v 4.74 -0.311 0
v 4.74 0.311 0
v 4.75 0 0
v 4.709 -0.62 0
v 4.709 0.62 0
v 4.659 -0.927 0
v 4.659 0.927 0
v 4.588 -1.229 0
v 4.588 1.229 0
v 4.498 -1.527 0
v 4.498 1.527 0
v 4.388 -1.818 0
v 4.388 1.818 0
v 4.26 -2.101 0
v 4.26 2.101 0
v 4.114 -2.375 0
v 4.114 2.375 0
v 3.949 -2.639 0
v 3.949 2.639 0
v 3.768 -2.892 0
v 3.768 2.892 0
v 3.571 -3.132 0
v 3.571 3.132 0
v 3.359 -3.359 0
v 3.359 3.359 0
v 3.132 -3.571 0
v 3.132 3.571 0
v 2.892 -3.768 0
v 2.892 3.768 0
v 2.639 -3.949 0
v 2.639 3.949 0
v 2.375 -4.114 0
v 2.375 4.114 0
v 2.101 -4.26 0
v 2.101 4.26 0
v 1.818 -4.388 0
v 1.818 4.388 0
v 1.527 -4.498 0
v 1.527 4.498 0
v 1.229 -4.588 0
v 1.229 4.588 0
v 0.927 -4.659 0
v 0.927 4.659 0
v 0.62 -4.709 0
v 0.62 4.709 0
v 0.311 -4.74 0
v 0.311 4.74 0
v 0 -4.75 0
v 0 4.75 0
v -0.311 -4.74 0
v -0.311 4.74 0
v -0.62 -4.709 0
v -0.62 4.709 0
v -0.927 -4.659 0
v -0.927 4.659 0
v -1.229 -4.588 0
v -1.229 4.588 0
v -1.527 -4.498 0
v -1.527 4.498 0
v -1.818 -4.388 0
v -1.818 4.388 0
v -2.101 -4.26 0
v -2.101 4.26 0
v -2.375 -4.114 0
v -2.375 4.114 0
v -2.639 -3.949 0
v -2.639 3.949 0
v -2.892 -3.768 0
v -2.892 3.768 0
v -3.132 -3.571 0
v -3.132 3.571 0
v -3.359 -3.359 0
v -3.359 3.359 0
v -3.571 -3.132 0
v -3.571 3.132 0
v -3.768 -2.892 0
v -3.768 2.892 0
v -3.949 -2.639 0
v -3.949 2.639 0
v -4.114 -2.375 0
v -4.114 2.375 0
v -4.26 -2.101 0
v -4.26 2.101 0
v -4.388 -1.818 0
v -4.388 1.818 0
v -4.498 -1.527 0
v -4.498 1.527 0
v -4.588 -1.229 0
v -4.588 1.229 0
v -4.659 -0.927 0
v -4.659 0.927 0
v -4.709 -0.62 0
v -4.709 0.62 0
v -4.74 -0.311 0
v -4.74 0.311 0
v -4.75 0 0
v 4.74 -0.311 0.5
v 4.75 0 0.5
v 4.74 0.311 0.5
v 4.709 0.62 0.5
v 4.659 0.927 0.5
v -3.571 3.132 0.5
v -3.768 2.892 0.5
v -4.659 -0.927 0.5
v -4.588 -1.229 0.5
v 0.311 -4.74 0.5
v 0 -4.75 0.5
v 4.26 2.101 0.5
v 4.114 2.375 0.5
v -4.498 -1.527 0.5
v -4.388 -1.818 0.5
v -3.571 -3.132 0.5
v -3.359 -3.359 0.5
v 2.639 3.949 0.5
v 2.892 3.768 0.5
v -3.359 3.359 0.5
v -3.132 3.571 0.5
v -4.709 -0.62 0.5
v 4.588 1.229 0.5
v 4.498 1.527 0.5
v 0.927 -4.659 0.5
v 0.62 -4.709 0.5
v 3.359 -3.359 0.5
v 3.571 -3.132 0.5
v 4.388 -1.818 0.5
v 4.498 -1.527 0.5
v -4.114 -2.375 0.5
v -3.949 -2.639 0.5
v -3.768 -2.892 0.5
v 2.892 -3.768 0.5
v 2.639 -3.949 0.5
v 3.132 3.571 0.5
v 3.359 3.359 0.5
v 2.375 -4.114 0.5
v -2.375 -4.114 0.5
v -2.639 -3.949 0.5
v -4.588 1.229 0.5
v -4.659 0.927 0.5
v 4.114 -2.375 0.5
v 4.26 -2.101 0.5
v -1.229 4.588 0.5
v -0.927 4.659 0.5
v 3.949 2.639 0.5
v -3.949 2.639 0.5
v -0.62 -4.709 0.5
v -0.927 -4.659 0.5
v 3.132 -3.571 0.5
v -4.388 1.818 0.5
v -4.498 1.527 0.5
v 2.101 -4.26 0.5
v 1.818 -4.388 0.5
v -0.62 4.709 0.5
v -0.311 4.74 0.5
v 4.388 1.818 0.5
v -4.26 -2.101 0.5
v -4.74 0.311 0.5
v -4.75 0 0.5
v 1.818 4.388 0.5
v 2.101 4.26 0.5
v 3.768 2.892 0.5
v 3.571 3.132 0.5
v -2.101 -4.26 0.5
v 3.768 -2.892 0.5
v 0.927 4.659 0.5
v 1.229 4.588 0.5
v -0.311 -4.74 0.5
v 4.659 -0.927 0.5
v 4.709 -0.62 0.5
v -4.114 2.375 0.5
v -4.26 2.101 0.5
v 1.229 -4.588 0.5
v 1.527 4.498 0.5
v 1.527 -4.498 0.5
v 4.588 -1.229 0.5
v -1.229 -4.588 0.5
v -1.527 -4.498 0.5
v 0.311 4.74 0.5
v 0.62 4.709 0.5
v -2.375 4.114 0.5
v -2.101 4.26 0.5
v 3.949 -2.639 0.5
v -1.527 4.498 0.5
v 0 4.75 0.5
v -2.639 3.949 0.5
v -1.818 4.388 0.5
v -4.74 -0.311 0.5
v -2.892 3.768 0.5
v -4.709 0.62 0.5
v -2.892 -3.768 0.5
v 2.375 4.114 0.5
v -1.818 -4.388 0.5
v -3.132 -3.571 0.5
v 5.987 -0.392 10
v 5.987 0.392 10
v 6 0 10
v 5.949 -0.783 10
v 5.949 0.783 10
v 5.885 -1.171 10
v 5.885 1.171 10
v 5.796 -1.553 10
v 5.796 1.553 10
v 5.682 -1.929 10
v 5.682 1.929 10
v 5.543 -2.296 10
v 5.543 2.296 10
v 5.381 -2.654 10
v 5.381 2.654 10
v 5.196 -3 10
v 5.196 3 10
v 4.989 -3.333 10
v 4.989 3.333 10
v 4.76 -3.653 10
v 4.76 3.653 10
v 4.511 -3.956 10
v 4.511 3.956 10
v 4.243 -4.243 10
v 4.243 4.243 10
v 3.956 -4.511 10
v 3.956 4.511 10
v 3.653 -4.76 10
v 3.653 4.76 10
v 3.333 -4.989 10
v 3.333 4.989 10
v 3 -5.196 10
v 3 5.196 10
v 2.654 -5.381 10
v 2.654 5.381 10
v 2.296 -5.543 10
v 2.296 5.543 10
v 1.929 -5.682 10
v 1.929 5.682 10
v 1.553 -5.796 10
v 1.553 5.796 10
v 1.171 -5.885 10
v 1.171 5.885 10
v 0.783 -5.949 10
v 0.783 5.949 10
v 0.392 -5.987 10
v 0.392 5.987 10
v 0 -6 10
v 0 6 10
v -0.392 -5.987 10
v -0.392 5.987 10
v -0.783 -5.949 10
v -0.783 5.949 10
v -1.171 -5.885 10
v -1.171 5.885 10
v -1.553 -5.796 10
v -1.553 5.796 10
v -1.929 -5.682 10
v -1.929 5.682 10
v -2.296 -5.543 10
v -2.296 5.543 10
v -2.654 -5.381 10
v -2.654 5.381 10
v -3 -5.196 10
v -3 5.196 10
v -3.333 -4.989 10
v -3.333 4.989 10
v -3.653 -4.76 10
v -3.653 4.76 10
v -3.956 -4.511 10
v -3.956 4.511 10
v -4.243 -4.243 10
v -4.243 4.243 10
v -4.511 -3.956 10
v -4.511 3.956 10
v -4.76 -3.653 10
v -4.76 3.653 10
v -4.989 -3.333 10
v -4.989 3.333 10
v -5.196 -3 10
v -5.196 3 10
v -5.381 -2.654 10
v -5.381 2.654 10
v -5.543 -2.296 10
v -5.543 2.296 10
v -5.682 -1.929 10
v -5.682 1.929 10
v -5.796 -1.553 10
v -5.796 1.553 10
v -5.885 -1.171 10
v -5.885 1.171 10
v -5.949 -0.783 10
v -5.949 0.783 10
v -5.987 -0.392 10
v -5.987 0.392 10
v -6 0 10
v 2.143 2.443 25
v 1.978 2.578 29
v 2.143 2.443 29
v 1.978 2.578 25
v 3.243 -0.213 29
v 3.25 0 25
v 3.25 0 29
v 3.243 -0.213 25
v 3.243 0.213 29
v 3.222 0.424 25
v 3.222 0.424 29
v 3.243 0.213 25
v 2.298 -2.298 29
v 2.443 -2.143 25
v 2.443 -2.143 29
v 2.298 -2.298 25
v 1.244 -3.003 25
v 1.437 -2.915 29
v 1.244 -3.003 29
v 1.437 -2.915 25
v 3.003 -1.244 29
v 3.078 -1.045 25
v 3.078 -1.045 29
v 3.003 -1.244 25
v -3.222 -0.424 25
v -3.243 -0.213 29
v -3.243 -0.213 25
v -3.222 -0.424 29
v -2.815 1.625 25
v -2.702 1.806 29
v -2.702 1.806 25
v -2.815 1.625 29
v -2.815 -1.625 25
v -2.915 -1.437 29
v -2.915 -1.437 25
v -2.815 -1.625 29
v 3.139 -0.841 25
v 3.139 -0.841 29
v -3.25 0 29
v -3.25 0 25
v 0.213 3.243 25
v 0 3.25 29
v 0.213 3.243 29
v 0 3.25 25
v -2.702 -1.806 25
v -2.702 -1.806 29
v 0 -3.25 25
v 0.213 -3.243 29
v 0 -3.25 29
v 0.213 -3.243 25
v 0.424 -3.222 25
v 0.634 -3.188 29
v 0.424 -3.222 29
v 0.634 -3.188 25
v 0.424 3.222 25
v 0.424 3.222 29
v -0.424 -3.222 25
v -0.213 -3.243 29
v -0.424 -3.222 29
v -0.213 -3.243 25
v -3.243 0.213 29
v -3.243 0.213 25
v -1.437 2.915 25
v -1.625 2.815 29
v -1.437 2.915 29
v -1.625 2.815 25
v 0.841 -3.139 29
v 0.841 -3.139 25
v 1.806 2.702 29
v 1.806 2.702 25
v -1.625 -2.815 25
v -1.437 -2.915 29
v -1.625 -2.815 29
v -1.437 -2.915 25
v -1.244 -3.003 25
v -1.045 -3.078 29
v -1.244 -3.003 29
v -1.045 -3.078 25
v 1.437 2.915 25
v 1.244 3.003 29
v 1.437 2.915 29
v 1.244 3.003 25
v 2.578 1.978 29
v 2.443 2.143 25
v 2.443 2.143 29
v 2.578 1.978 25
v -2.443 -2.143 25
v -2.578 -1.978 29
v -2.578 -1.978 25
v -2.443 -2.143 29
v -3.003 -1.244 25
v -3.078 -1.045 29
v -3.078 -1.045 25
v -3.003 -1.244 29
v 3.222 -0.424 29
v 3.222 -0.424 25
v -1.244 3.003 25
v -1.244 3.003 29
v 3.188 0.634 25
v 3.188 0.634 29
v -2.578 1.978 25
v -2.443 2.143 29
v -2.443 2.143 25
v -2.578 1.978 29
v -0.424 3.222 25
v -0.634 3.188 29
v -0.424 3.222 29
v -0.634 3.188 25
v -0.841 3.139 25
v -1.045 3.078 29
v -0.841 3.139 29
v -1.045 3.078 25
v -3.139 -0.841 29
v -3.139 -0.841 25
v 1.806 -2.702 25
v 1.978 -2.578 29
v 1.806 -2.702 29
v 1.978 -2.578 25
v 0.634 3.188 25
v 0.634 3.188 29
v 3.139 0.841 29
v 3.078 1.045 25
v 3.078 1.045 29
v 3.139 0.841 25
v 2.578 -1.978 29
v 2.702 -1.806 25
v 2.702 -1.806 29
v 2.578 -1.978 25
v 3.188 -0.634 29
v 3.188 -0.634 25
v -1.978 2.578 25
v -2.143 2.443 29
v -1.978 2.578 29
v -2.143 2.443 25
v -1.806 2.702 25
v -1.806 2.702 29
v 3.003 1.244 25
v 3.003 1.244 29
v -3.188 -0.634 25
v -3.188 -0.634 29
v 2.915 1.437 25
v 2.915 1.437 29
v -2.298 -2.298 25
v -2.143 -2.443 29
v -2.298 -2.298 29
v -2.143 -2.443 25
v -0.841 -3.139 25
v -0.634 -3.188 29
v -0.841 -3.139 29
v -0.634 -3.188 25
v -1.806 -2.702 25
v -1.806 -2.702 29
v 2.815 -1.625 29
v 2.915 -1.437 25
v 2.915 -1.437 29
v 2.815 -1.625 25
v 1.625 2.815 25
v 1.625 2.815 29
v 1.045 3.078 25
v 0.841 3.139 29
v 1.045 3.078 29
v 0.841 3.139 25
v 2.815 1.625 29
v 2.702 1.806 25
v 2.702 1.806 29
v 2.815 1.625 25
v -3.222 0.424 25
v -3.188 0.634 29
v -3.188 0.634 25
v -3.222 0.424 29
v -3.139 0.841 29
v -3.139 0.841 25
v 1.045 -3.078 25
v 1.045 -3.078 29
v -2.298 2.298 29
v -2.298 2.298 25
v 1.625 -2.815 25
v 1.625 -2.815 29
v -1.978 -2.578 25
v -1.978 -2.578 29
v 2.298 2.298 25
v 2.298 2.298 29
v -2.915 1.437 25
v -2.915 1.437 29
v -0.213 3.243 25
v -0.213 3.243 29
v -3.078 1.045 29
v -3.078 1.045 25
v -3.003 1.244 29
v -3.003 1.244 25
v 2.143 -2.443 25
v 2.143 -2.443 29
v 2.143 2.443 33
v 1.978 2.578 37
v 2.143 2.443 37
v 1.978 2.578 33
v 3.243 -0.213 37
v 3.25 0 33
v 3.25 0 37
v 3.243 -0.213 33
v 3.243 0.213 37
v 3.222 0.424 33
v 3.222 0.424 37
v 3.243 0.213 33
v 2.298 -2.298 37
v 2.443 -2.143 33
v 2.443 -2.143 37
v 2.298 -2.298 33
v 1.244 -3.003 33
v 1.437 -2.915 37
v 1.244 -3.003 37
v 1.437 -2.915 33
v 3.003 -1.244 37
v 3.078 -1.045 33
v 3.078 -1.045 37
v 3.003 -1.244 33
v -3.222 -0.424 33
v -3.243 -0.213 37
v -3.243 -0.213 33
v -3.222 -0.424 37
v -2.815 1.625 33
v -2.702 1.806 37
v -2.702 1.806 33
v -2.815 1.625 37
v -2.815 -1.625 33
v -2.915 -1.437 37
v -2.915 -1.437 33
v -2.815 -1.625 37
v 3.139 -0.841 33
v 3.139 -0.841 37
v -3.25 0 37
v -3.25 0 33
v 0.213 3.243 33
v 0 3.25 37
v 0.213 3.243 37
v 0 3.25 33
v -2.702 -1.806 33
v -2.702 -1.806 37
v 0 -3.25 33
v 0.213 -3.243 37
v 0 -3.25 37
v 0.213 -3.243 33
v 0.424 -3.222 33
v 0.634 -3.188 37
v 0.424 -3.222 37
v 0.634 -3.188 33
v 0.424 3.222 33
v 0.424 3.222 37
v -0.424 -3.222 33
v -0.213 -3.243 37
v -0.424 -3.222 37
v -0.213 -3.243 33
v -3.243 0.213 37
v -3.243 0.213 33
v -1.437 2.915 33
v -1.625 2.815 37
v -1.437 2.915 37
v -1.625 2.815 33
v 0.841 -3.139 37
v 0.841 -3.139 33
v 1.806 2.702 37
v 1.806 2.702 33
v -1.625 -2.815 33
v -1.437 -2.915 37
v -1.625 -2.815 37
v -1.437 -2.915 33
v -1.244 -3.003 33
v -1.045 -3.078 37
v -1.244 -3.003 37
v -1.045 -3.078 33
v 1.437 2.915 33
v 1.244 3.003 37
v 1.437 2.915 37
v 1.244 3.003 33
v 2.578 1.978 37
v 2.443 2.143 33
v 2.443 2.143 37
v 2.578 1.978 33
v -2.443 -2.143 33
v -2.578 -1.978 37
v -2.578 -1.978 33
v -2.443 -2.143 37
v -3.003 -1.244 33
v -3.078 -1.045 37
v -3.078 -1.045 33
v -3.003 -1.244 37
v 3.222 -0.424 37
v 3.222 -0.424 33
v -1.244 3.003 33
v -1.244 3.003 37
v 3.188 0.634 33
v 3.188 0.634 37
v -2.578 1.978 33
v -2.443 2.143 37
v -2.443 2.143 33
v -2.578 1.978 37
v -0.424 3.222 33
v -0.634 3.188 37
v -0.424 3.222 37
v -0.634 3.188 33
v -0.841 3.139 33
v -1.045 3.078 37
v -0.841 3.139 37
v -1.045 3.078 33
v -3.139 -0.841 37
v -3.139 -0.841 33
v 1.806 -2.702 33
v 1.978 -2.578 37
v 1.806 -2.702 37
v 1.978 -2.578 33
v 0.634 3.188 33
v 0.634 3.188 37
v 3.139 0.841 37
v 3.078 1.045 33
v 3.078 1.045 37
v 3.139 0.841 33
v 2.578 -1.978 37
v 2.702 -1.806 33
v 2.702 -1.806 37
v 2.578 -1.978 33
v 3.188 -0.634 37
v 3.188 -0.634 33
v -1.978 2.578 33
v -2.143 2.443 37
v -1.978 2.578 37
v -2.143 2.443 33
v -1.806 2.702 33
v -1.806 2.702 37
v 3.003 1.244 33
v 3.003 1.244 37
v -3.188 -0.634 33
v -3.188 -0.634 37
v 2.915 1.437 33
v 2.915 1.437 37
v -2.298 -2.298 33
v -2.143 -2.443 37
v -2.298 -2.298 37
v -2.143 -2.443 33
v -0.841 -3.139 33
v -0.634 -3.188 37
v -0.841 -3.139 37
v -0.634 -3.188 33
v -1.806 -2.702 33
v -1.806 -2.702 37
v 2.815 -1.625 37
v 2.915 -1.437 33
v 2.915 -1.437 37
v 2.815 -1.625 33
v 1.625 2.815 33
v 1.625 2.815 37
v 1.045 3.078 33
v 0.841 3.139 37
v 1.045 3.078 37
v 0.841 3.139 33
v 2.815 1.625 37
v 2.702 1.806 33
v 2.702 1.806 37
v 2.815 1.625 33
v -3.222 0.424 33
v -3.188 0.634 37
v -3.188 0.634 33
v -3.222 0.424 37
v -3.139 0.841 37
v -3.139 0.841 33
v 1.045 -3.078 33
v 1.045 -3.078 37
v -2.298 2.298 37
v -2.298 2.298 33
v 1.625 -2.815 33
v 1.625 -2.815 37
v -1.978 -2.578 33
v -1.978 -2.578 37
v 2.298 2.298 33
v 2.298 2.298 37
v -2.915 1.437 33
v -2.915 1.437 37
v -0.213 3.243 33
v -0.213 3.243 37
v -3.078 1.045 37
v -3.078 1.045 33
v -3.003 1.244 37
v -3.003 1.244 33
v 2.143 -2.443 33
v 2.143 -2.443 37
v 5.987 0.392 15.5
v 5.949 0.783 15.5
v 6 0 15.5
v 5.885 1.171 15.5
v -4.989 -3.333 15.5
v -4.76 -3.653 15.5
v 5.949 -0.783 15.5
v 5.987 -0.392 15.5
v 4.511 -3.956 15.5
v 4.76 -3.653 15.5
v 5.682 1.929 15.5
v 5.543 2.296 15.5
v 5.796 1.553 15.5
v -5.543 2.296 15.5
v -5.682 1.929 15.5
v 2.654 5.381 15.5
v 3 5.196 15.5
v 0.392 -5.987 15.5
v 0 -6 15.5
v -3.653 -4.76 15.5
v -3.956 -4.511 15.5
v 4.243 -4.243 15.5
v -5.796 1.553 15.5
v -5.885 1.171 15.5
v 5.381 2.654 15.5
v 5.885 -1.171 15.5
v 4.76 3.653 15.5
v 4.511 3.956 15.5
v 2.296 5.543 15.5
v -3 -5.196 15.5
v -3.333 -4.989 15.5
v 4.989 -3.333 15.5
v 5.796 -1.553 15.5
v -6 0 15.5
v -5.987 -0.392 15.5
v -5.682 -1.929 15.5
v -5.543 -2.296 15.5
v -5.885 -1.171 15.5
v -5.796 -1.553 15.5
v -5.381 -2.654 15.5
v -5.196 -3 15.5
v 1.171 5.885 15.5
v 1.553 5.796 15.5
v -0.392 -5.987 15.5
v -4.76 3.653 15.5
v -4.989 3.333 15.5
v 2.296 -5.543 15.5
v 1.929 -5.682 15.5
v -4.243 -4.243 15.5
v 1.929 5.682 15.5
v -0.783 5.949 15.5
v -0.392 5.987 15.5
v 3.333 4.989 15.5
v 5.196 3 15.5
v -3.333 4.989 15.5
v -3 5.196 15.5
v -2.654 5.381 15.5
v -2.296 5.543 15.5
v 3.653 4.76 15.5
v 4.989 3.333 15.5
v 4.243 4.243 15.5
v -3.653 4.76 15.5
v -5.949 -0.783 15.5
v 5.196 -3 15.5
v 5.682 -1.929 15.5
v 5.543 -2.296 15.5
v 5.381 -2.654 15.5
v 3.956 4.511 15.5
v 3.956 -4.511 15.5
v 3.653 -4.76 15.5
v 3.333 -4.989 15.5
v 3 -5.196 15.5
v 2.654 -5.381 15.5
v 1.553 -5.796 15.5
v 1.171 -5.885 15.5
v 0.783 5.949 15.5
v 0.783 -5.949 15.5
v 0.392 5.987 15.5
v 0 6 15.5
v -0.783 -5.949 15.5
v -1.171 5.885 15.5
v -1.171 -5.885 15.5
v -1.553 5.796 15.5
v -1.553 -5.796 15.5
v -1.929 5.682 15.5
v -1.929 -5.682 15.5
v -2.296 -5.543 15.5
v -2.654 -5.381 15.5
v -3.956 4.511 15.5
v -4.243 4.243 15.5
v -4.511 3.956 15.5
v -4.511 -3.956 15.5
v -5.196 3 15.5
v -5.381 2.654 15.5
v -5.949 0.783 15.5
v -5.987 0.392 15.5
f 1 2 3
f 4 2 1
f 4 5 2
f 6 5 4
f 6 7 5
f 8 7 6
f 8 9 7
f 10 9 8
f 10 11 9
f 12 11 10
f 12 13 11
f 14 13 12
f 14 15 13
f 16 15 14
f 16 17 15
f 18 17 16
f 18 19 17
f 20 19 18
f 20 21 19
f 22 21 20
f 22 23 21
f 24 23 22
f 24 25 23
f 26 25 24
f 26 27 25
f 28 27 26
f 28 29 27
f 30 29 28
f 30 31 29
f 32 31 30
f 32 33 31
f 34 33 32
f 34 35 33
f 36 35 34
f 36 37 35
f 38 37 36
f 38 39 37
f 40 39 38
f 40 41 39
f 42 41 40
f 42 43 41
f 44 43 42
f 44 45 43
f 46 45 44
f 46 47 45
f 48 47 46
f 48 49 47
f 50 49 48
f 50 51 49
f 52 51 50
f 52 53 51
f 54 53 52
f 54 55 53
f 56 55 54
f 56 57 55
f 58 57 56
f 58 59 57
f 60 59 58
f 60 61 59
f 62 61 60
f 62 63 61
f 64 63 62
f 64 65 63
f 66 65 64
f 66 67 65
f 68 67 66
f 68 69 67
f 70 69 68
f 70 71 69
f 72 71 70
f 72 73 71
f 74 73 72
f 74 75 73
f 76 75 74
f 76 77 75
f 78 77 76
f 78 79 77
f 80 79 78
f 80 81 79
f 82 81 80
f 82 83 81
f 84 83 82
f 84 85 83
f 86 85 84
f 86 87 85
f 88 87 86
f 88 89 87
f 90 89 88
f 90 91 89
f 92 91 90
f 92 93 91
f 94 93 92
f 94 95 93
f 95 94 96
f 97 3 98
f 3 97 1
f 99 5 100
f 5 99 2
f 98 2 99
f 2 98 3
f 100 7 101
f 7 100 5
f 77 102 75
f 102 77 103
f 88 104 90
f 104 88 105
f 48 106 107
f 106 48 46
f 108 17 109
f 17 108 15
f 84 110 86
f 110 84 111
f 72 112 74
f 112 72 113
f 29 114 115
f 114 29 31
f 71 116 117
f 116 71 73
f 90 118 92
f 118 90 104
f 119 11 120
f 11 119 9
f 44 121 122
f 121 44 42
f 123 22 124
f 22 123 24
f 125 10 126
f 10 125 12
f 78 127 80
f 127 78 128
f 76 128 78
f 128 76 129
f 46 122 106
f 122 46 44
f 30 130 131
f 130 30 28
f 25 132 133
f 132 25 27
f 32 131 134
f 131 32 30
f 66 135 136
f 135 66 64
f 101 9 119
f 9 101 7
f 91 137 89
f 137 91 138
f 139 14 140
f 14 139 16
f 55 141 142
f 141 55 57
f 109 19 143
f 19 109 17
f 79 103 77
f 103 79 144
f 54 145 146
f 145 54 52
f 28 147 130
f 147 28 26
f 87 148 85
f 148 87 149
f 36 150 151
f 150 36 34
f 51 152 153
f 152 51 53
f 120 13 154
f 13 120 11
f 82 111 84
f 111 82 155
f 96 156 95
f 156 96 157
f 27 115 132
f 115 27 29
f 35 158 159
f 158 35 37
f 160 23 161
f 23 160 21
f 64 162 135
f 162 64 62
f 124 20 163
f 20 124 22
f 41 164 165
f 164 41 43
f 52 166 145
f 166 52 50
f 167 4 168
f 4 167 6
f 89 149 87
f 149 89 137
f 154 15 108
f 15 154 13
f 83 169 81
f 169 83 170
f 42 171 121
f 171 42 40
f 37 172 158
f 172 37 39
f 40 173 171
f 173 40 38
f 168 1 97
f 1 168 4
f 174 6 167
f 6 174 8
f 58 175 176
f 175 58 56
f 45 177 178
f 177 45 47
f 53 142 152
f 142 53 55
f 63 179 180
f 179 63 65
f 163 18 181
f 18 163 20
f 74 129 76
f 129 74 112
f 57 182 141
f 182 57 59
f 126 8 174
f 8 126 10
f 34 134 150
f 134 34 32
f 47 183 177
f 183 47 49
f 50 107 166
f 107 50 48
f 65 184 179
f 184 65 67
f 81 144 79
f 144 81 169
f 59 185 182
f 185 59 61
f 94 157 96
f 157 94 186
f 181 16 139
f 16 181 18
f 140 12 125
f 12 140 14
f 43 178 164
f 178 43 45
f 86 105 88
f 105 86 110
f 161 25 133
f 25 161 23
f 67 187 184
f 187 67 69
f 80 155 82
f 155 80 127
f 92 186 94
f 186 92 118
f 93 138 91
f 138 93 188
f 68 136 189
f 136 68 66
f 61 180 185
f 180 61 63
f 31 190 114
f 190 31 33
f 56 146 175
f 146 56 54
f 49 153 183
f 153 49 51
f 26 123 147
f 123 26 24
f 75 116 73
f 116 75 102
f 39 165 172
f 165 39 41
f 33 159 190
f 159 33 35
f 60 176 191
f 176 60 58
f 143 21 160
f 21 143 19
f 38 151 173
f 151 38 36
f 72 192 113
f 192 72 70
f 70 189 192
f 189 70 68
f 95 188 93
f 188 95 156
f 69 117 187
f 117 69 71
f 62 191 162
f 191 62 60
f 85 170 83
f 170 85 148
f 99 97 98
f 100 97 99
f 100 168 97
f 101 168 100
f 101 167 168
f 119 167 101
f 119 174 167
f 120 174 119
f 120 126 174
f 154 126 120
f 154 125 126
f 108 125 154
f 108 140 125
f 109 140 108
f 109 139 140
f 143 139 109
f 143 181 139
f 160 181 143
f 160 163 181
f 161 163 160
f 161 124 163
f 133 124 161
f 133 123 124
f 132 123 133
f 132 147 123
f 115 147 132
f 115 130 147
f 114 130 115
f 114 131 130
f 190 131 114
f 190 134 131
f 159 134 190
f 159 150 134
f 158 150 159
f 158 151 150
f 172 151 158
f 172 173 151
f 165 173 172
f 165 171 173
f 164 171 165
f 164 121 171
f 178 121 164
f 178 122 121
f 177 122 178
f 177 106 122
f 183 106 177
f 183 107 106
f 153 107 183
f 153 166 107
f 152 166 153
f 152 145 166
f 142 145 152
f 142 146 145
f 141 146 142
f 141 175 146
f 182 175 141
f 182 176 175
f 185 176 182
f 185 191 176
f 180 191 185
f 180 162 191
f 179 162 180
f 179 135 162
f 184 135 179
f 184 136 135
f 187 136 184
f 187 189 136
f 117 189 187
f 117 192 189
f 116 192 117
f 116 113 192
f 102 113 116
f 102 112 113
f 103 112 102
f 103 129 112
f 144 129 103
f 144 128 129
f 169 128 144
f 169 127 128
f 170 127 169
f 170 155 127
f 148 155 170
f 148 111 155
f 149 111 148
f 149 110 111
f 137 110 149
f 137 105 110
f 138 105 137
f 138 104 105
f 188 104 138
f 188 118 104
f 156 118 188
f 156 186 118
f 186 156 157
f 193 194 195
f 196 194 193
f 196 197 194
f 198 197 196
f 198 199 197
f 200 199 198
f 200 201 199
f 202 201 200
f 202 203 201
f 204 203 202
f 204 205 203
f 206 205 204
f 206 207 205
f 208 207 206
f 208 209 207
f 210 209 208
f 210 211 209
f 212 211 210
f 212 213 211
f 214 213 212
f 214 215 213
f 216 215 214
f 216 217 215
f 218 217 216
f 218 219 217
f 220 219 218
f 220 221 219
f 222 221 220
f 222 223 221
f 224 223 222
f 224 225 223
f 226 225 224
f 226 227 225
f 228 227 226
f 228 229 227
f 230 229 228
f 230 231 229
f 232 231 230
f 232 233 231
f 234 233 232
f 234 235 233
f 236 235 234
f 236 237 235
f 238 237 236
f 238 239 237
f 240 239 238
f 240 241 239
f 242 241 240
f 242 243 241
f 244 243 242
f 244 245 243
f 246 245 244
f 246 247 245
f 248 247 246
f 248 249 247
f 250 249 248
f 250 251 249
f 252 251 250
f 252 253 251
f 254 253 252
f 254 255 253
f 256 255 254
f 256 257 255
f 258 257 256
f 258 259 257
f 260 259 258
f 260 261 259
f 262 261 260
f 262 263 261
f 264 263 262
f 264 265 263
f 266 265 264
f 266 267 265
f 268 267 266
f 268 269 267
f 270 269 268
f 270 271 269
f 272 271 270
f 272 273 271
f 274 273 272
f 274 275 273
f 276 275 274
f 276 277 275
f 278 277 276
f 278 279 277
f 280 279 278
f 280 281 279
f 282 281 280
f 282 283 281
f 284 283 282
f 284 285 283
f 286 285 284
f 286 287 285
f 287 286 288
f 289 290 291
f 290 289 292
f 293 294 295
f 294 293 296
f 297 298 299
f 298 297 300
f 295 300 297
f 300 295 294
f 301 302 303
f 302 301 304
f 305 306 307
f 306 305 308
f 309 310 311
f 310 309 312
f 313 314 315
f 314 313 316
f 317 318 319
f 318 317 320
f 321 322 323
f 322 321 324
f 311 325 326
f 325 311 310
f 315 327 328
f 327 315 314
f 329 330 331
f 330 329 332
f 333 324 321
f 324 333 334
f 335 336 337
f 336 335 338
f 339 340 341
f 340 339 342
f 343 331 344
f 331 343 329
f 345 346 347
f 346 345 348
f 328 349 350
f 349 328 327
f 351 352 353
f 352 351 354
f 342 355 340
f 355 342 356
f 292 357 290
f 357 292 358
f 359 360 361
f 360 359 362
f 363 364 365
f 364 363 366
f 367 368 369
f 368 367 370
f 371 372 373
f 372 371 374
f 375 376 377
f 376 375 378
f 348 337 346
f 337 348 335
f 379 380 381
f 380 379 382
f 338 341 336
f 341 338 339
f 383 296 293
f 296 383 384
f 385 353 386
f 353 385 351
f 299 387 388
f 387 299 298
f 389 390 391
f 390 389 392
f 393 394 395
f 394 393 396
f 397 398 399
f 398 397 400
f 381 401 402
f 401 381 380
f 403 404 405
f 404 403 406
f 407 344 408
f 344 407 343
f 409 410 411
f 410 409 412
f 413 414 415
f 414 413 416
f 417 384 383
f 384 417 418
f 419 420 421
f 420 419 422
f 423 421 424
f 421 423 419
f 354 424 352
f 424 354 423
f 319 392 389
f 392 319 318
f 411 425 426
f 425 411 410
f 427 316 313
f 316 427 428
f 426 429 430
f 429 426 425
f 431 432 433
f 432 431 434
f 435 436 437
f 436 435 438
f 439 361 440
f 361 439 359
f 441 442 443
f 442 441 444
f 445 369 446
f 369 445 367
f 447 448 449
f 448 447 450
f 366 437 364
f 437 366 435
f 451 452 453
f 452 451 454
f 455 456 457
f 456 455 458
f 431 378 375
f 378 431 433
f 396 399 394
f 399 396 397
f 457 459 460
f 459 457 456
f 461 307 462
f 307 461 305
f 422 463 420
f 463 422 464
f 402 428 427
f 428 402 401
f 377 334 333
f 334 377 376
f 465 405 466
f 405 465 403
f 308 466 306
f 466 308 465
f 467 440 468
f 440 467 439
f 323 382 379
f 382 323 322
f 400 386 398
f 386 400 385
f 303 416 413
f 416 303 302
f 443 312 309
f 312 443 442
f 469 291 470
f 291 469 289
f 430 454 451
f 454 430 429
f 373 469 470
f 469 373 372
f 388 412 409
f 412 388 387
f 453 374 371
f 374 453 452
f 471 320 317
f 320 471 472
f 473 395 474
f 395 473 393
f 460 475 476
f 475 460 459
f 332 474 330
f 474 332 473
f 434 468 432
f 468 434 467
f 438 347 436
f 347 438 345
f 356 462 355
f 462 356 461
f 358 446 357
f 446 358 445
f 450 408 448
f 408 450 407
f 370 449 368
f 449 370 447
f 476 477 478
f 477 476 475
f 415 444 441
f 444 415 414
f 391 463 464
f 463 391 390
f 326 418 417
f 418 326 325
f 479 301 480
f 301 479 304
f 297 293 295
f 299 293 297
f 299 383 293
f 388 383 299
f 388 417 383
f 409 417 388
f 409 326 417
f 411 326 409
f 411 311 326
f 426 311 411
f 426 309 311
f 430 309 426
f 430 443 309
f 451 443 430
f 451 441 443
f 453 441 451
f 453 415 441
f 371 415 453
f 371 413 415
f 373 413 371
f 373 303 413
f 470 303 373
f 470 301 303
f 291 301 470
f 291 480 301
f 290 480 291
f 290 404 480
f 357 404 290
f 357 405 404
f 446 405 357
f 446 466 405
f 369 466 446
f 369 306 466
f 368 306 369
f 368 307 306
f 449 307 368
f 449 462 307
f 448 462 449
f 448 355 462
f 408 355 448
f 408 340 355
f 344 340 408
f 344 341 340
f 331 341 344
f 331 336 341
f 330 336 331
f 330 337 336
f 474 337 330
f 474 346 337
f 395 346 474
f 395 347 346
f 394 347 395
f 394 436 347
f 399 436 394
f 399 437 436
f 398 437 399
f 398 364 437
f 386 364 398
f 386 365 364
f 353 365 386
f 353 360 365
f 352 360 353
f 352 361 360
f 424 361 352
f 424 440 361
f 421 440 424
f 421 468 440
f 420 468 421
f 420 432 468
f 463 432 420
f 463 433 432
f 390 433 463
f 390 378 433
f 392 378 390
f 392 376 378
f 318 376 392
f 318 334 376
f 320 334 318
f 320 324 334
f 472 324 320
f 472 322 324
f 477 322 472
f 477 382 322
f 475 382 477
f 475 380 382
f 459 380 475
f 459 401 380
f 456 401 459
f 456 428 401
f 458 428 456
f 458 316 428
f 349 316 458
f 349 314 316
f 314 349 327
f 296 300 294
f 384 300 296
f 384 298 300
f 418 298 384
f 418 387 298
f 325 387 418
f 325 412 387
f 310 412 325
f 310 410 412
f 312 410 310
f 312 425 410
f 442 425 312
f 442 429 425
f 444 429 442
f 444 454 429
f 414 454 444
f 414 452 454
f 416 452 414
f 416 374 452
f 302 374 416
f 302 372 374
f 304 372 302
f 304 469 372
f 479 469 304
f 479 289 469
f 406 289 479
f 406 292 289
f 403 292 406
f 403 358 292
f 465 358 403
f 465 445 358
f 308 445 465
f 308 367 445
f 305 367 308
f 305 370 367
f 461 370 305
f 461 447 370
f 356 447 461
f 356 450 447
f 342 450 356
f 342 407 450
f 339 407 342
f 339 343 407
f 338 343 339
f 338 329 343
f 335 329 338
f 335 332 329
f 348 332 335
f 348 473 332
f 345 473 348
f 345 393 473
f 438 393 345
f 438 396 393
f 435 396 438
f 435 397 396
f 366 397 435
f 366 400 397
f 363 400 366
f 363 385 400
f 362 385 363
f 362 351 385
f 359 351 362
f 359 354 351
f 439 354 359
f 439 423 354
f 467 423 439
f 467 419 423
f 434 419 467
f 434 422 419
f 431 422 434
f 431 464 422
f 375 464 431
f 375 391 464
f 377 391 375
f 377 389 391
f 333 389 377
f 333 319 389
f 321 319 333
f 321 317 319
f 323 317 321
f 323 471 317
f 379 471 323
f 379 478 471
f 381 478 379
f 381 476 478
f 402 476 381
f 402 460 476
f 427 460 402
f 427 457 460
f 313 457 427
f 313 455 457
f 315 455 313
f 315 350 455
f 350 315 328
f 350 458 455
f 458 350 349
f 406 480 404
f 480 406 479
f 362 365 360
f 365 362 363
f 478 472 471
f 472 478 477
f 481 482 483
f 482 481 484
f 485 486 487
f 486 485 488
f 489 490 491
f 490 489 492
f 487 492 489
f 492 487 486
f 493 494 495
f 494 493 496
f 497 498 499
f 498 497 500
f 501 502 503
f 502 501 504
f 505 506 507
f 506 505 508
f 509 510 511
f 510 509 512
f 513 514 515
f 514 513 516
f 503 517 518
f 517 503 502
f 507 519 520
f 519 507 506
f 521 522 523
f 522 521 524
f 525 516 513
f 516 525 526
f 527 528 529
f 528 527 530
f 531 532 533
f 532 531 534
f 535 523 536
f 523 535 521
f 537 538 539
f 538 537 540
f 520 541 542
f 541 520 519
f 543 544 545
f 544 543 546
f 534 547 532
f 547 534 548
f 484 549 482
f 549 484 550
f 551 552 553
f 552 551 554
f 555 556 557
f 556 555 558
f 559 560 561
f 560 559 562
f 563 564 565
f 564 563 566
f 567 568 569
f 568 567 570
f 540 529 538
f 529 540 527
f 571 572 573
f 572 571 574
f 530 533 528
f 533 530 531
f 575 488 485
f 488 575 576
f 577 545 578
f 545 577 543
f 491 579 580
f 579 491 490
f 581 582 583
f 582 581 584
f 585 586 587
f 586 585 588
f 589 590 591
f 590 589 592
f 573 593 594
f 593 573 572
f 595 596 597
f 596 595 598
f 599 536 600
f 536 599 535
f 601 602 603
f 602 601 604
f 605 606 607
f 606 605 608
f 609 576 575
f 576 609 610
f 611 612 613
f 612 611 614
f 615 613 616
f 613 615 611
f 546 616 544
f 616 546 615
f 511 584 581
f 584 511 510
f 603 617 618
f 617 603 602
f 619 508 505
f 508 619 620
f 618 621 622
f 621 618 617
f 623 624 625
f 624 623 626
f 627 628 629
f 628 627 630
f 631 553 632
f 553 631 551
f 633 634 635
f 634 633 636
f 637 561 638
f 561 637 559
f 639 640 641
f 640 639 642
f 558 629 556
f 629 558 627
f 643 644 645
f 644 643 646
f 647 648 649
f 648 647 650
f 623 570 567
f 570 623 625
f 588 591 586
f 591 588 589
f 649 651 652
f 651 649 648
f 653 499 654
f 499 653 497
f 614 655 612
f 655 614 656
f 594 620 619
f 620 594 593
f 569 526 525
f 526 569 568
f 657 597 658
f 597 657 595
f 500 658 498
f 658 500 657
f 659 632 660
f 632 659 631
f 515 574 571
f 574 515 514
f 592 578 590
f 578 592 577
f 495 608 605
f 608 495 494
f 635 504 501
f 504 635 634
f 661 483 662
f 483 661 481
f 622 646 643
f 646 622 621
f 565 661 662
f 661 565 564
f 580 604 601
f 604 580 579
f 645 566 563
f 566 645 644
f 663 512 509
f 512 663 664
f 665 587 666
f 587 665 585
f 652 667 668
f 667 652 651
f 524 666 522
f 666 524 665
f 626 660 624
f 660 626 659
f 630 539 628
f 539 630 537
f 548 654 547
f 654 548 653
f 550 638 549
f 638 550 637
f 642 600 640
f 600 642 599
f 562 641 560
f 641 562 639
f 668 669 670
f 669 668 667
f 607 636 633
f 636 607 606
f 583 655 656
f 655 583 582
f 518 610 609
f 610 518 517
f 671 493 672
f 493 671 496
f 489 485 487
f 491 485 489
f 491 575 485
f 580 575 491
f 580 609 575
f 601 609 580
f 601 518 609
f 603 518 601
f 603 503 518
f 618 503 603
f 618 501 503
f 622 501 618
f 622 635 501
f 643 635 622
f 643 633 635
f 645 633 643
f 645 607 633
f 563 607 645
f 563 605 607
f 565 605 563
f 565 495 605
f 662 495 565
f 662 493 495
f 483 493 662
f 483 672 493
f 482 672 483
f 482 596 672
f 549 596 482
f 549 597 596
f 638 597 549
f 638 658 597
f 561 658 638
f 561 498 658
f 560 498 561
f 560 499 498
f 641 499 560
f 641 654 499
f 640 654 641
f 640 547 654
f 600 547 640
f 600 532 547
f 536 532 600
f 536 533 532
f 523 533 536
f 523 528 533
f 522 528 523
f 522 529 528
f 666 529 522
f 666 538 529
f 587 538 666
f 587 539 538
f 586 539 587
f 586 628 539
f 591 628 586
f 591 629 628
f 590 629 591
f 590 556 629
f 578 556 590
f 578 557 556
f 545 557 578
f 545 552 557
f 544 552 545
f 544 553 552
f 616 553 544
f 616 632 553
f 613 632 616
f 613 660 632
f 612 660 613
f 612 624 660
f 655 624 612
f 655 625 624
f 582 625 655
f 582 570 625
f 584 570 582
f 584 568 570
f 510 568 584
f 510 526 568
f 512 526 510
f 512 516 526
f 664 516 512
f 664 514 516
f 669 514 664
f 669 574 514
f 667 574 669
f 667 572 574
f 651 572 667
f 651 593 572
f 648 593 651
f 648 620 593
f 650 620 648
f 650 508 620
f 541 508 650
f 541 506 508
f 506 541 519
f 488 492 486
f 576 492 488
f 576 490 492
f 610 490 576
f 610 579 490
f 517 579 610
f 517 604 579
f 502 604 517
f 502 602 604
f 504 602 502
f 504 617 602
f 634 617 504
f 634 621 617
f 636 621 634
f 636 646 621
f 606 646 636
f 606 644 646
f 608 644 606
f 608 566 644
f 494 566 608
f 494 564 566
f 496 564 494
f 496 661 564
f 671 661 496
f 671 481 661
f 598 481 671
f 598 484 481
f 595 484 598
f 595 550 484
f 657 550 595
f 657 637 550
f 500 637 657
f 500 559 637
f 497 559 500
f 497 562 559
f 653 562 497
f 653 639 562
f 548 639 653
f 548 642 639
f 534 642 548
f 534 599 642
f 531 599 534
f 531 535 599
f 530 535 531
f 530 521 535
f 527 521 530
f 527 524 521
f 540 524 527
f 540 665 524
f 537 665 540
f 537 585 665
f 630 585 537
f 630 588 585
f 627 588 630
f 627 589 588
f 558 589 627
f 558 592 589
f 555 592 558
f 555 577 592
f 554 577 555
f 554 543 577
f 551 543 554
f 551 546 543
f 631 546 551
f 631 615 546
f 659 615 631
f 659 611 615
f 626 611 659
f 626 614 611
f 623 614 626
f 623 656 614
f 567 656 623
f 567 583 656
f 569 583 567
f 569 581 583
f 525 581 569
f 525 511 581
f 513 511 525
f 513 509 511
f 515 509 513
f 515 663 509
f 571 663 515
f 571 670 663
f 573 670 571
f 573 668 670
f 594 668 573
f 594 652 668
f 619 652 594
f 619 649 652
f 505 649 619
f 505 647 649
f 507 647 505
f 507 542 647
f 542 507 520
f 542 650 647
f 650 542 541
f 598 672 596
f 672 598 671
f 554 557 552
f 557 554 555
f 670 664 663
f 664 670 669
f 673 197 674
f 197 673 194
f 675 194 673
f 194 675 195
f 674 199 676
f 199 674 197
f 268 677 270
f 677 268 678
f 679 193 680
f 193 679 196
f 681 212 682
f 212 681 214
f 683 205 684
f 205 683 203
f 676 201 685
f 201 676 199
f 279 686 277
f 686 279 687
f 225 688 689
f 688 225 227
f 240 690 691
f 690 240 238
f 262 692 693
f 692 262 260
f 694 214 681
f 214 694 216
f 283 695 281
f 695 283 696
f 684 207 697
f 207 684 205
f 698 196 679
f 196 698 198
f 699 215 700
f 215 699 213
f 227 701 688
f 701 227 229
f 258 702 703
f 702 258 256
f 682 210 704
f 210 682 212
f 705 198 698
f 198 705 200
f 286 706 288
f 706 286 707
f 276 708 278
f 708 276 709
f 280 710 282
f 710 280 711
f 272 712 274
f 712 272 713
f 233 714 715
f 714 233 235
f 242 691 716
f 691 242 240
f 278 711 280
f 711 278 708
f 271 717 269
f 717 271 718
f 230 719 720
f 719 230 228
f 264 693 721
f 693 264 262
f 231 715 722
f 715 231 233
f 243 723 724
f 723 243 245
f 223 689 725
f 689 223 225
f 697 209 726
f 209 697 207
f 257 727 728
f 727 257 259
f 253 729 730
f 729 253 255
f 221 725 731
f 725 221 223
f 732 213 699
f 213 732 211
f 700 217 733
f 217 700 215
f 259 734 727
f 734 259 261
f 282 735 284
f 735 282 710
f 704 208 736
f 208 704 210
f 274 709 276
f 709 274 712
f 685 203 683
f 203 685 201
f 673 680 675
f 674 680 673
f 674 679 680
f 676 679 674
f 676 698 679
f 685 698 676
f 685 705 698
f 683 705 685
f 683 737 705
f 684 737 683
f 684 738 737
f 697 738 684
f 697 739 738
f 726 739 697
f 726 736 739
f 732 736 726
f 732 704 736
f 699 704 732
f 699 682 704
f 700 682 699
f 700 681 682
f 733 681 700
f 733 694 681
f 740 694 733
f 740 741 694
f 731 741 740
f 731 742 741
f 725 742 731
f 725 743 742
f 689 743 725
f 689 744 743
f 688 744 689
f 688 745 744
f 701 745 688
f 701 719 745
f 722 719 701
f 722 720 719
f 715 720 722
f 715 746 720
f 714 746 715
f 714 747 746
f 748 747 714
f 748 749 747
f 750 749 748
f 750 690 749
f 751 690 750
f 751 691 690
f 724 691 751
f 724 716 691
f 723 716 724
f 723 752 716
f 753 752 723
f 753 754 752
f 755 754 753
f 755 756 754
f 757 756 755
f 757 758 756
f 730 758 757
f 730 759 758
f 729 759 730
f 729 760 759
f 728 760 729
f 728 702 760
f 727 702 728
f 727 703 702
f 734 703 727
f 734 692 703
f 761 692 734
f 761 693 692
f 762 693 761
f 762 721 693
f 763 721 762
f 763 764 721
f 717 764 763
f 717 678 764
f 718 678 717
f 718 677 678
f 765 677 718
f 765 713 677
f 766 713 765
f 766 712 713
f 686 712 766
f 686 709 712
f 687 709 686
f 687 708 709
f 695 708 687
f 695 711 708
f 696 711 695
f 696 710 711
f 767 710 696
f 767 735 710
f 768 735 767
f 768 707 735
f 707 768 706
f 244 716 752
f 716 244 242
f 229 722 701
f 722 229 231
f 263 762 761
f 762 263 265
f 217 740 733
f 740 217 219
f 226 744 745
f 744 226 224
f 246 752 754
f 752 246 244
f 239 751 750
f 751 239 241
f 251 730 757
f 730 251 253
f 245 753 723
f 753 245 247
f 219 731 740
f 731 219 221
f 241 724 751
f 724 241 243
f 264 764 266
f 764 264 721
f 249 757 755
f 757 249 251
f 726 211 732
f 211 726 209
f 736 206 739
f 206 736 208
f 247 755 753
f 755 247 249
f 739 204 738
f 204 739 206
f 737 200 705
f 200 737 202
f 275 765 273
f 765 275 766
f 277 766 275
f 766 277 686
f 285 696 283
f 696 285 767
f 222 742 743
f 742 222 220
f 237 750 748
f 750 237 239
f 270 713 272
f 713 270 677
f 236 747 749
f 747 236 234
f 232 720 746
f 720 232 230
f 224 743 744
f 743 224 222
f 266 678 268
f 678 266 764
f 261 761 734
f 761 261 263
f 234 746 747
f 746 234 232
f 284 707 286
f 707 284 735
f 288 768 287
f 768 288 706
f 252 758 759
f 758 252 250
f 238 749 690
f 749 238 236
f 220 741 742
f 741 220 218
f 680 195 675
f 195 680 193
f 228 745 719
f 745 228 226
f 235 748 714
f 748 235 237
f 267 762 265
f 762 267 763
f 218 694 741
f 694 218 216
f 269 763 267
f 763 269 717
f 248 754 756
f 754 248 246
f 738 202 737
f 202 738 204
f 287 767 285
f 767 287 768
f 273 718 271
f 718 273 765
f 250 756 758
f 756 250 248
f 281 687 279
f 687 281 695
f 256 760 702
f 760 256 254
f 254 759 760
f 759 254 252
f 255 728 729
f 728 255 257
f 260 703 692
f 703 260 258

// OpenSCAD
// Hose-barb reducer: joins 8 mm ID silicone tubing to 5 mm ID silicone tubing
// Print orientation: standing upright along +Z, base on XY plane

// ---------------- Parameters ----------------
reducer_d        = 12;   // central bore diameter (through full length)
barb_8_outer_bot = 7.5;  // 8 mm tubing barb outer diameter at bottom
barb_8_outer_top = 9.5;  // 8 mm tubing barb outer diameter at top
barb_8_height    = 10;   // 8 mm tubing barb height
barb_8_start_z   = 0;    // 8 mm tubing barb stack start height

barb_5_outer_bot = 6.5;  // 5 mm tubing barb outer diameter at bottom
barb_5_outer_top = 5.0;  // 5 mm tubing barb outer diameter at top
barb_5_height    = 8;    // 5 mm tubing barb height
barb_5_start_z   = 25;   // 5 mm tubing barb stack start height

collar_d         = 12;   // cylindrical collar diameter (z = 20 to 25)
eps              = 0.5;  // overshoot for clean boolean cuts

$fn = 96;

// ---------------- Modules ----------------
module barb_8(z0) {
    // Sawtooth profile: grow 7.5 -> 9.5, step back to 7.5
    difference() {
        union() {
            for (h = [0 : barb_8_height / 2])
                cylinder(d = barb_8_outer_bot + h * (barb_8_outer_top - barb_8_outer_bot) / (barb_8_height / 2), h = barb_8_height / 2);
            // top flat, same diameter as top of cone
            cylinder(d = barb_8_outer_top, h = 0.01);
        }
        translate([0, 0, z0 + eps])
            cylinder(d = reducer_d, h = barb_8_height + 2 * eps);
    }
}

module barb_5(z0) {
    // Inverted sawtooth: shrink 6.5 -> 5.0, step back out to 6.5
    difference() {
        union() {
            for (h = [0 : barb_5_height / 2])
                cylinder(d = barb_5_outer_bot - h * (barb_5_outer_bot - barb_5_outer_top) / (barb_5_height / 2), h = barb_5_height / 2);
            // top flat, same diameter as top of cone
            cylinder(d = barb_5_outer_top, h = 0.01);
        }
        translate([0, 0, z0 + eps])
            cylinder(d = reducer_d, h = barb_5_height + 2 * eps);
    }
}

module collar(z0) {
    translate([0, 0, z0])
        cylinder(d = collar_d, h = 5 + eps);
}

// ---------------- Assembly ----------------
union() {
    // 8 mm tubing barbs
    barb_8(barb_8_start_z);
    translate([0, 0, barb_8_start_z + barb_8_height])
        barb_8(barb_8_start_z);

    // Collar
    collar(barb_8_start_z + barb_8_height);

    // 5 mm tubing barbs
    translate([0, 0, barb_5_start_z])
        barb_5(barb_5_start_z);
    translate([0, 0, barb_5_start_z + barb_5_height])
        barb_5(barb_5_start_z);
}
